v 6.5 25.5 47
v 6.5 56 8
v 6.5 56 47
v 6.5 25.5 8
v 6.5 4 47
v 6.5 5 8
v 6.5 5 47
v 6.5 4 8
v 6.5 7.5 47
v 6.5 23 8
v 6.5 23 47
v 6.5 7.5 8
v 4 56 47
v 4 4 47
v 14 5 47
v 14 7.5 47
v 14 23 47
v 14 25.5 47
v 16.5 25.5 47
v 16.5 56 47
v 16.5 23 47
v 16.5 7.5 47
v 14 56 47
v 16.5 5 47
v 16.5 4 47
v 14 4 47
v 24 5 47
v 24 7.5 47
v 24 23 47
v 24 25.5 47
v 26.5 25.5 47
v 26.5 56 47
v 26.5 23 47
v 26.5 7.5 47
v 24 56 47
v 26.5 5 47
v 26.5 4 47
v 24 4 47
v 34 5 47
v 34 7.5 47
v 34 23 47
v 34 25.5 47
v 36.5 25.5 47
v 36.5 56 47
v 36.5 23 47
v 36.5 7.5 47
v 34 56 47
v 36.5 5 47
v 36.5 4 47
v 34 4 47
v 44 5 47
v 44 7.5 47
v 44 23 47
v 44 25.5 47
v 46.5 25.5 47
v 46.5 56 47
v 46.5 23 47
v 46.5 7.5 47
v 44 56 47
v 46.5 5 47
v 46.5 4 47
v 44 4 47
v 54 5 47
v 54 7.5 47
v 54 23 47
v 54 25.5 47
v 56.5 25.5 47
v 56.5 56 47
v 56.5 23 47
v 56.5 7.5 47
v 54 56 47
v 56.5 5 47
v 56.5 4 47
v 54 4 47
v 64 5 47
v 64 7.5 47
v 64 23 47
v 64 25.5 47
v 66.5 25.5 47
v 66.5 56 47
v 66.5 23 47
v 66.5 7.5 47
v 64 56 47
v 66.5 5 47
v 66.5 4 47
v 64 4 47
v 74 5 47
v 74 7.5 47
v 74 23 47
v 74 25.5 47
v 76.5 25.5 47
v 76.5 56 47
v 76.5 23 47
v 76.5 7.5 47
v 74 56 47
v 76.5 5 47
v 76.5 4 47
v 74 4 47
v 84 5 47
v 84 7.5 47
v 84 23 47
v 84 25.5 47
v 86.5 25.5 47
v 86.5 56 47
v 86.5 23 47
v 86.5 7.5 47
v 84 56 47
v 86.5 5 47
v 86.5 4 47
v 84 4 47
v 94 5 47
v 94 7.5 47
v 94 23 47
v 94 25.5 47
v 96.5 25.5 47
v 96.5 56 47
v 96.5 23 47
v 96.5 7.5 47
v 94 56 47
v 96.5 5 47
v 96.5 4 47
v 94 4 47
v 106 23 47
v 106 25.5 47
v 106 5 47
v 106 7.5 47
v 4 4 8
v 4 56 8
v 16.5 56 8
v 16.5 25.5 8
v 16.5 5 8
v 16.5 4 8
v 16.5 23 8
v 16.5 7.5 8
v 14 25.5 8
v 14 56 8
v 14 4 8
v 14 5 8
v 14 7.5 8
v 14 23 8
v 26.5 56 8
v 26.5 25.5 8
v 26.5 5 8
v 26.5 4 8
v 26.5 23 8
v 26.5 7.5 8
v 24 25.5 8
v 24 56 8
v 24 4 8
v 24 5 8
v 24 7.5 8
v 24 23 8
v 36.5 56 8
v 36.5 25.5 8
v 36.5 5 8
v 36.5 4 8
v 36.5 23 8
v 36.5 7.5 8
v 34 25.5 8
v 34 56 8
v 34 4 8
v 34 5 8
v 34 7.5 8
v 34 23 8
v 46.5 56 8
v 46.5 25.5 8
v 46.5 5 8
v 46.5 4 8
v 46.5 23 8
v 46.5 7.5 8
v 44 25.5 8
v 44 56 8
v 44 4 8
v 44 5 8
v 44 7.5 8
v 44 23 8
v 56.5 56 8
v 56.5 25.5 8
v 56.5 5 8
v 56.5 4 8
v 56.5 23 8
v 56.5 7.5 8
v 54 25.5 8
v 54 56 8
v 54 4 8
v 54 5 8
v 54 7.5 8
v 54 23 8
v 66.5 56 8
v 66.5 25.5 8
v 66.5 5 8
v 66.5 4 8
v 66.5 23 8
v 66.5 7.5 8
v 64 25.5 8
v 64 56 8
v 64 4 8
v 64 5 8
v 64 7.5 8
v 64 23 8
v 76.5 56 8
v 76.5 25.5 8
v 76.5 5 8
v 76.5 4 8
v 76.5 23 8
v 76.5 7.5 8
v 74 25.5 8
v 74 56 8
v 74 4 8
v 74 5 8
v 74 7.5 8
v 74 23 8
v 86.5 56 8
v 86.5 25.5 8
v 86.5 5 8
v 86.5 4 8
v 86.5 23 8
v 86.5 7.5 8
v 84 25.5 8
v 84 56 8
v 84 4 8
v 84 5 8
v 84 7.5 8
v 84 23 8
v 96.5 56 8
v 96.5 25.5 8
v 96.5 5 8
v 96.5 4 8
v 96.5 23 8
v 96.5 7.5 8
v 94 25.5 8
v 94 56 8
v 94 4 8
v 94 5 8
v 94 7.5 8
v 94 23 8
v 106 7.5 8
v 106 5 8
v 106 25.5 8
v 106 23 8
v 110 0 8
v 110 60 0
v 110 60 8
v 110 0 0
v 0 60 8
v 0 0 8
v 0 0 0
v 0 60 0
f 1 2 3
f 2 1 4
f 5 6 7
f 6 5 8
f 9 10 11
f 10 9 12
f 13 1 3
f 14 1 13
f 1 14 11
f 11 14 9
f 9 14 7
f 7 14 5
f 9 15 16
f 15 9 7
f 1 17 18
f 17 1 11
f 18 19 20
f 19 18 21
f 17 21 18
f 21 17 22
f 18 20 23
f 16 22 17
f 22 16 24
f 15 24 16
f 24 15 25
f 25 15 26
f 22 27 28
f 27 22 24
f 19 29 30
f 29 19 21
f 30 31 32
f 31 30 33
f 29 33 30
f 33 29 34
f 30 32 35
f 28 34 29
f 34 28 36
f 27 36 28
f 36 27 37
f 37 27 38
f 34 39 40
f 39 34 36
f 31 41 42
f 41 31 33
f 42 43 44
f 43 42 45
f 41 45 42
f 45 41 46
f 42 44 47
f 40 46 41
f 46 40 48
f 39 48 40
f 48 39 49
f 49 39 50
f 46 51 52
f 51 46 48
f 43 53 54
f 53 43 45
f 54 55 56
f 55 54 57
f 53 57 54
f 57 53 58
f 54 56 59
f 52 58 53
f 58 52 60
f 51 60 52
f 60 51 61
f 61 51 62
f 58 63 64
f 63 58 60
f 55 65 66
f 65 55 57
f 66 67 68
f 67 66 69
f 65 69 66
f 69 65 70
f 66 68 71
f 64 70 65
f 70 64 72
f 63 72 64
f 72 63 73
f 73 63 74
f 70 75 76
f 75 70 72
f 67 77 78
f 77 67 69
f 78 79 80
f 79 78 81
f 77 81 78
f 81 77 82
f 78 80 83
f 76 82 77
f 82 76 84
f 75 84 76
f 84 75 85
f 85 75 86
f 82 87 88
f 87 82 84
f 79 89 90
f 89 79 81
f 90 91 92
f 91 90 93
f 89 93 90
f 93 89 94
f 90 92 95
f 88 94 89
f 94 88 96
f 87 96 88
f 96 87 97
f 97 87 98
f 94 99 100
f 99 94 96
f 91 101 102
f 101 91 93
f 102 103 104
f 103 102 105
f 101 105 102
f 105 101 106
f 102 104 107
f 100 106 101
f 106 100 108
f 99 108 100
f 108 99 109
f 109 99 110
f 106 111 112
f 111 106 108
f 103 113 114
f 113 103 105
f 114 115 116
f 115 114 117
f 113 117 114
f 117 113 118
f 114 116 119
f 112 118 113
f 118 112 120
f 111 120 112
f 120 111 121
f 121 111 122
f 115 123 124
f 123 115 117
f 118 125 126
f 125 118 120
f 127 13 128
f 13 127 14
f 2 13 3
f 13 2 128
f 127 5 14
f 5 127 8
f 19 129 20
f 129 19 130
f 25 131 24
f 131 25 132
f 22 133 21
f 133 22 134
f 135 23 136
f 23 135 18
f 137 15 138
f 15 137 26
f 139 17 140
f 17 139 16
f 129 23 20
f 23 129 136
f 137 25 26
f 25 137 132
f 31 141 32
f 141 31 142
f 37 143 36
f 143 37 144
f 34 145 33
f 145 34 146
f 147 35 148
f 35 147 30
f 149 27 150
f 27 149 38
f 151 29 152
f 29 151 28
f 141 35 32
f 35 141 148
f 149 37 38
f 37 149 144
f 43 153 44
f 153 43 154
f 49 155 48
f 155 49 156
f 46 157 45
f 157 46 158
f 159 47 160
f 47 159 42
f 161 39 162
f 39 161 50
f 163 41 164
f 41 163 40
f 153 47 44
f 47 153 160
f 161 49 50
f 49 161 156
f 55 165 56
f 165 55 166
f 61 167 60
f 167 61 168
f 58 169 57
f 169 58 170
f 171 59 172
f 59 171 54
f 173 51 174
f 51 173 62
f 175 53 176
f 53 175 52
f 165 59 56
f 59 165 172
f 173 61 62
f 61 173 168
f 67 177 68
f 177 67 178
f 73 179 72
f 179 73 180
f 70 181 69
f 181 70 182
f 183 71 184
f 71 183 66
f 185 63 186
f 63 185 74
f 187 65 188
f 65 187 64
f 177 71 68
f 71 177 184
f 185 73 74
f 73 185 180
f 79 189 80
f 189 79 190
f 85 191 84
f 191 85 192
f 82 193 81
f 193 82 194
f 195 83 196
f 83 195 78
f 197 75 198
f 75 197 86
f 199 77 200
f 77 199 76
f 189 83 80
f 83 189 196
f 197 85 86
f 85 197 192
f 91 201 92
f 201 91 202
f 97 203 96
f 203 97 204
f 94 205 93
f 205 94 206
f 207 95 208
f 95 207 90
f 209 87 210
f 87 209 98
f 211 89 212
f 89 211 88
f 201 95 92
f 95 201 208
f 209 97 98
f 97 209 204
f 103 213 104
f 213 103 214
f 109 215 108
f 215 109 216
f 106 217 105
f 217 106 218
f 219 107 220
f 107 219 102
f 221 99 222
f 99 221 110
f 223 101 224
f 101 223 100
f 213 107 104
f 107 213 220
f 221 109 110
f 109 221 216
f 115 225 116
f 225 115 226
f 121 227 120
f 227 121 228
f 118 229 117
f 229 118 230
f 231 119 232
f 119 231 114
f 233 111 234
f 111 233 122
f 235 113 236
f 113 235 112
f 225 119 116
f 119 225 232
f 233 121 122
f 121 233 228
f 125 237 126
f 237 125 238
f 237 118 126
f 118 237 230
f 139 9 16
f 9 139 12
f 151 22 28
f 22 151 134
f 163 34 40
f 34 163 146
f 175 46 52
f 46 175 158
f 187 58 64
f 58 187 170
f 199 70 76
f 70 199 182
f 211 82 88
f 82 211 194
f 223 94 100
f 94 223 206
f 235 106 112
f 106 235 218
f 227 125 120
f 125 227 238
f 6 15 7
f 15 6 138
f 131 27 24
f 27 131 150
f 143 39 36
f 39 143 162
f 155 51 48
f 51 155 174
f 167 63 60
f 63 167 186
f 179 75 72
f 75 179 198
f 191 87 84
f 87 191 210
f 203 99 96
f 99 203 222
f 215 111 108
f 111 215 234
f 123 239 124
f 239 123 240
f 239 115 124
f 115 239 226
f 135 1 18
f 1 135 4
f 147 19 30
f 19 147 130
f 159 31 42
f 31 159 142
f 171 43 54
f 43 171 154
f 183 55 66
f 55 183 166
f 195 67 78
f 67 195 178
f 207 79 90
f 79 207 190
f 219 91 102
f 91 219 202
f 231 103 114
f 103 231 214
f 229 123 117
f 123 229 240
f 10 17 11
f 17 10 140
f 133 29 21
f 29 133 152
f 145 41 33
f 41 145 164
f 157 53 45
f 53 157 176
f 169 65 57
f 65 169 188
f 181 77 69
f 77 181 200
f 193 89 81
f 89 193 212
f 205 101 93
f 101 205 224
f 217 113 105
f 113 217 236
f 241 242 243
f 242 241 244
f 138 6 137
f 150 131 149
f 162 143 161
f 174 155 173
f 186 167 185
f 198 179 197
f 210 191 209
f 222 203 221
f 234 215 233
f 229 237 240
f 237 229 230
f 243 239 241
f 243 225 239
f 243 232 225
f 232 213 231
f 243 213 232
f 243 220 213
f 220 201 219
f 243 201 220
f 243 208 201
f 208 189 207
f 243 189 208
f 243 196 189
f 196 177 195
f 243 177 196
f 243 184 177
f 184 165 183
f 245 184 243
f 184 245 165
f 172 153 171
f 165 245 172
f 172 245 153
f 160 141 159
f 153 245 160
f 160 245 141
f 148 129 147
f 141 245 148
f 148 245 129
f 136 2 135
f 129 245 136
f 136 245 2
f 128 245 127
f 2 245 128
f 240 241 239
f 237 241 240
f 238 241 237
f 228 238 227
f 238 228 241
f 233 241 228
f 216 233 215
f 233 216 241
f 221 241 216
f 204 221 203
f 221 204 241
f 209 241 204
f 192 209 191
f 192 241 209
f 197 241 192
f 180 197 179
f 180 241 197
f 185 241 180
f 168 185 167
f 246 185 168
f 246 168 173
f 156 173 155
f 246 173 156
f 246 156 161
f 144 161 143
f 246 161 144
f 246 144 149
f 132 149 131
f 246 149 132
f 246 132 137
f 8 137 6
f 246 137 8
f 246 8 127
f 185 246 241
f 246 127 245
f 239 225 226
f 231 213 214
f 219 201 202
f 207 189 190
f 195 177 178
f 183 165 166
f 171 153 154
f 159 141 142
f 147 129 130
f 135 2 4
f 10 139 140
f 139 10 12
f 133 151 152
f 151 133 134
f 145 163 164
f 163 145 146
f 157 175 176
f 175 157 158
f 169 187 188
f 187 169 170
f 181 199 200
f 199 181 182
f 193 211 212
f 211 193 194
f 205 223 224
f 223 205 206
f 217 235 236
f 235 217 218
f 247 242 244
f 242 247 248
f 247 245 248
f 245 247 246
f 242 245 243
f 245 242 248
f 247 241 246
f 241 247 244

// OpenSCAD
$fn = 32;

// ----------------------------------------------------------------------
// Heatsink: cross fin block
// ----------------------------------------------------------------------

// --- parameters (mm) ---
base_l = 110;             // base length, X
base_w = 60;              // base width, Y
base_t = 8;               // base plate thickness
fin_h = 40;               // fin height above the base
fin_t = 2.5;              // fin thickness
edge = 4;                 // margin from the base ends
pitch = 10;               // fin pitch
rib_pitch = 18;           // cross rib pitch
fit_tol = 0.05;           // tolerance for press fits, mm
free_tol = 0.3;           // tolerance for clearance fits, mm

n_fins = floor((base_l - 2 * edge - fin_t) / pitch) + 1;  // fin count
total_h = base_t + fin_h - 1;  // overall height
n_ribs = floor((base_w - 2 * edge) / rib_pitch);  // rib count

union() {
  cube([base_l, base_w, base_t]);
  for (i = [0 : n_fins - 1])
    translate([edge + i * pitch, edge, base_t - 1])
      cube([fin_t, base_w - 2 * edge, fin_h]);
  for (i = [0 : n_ribs - 1])
    translate([edge, edge + 1 + i * rib_pitch, base_t - 1])
      cube([base_l - 2 * edge, fin_t, fin_h]);
}
